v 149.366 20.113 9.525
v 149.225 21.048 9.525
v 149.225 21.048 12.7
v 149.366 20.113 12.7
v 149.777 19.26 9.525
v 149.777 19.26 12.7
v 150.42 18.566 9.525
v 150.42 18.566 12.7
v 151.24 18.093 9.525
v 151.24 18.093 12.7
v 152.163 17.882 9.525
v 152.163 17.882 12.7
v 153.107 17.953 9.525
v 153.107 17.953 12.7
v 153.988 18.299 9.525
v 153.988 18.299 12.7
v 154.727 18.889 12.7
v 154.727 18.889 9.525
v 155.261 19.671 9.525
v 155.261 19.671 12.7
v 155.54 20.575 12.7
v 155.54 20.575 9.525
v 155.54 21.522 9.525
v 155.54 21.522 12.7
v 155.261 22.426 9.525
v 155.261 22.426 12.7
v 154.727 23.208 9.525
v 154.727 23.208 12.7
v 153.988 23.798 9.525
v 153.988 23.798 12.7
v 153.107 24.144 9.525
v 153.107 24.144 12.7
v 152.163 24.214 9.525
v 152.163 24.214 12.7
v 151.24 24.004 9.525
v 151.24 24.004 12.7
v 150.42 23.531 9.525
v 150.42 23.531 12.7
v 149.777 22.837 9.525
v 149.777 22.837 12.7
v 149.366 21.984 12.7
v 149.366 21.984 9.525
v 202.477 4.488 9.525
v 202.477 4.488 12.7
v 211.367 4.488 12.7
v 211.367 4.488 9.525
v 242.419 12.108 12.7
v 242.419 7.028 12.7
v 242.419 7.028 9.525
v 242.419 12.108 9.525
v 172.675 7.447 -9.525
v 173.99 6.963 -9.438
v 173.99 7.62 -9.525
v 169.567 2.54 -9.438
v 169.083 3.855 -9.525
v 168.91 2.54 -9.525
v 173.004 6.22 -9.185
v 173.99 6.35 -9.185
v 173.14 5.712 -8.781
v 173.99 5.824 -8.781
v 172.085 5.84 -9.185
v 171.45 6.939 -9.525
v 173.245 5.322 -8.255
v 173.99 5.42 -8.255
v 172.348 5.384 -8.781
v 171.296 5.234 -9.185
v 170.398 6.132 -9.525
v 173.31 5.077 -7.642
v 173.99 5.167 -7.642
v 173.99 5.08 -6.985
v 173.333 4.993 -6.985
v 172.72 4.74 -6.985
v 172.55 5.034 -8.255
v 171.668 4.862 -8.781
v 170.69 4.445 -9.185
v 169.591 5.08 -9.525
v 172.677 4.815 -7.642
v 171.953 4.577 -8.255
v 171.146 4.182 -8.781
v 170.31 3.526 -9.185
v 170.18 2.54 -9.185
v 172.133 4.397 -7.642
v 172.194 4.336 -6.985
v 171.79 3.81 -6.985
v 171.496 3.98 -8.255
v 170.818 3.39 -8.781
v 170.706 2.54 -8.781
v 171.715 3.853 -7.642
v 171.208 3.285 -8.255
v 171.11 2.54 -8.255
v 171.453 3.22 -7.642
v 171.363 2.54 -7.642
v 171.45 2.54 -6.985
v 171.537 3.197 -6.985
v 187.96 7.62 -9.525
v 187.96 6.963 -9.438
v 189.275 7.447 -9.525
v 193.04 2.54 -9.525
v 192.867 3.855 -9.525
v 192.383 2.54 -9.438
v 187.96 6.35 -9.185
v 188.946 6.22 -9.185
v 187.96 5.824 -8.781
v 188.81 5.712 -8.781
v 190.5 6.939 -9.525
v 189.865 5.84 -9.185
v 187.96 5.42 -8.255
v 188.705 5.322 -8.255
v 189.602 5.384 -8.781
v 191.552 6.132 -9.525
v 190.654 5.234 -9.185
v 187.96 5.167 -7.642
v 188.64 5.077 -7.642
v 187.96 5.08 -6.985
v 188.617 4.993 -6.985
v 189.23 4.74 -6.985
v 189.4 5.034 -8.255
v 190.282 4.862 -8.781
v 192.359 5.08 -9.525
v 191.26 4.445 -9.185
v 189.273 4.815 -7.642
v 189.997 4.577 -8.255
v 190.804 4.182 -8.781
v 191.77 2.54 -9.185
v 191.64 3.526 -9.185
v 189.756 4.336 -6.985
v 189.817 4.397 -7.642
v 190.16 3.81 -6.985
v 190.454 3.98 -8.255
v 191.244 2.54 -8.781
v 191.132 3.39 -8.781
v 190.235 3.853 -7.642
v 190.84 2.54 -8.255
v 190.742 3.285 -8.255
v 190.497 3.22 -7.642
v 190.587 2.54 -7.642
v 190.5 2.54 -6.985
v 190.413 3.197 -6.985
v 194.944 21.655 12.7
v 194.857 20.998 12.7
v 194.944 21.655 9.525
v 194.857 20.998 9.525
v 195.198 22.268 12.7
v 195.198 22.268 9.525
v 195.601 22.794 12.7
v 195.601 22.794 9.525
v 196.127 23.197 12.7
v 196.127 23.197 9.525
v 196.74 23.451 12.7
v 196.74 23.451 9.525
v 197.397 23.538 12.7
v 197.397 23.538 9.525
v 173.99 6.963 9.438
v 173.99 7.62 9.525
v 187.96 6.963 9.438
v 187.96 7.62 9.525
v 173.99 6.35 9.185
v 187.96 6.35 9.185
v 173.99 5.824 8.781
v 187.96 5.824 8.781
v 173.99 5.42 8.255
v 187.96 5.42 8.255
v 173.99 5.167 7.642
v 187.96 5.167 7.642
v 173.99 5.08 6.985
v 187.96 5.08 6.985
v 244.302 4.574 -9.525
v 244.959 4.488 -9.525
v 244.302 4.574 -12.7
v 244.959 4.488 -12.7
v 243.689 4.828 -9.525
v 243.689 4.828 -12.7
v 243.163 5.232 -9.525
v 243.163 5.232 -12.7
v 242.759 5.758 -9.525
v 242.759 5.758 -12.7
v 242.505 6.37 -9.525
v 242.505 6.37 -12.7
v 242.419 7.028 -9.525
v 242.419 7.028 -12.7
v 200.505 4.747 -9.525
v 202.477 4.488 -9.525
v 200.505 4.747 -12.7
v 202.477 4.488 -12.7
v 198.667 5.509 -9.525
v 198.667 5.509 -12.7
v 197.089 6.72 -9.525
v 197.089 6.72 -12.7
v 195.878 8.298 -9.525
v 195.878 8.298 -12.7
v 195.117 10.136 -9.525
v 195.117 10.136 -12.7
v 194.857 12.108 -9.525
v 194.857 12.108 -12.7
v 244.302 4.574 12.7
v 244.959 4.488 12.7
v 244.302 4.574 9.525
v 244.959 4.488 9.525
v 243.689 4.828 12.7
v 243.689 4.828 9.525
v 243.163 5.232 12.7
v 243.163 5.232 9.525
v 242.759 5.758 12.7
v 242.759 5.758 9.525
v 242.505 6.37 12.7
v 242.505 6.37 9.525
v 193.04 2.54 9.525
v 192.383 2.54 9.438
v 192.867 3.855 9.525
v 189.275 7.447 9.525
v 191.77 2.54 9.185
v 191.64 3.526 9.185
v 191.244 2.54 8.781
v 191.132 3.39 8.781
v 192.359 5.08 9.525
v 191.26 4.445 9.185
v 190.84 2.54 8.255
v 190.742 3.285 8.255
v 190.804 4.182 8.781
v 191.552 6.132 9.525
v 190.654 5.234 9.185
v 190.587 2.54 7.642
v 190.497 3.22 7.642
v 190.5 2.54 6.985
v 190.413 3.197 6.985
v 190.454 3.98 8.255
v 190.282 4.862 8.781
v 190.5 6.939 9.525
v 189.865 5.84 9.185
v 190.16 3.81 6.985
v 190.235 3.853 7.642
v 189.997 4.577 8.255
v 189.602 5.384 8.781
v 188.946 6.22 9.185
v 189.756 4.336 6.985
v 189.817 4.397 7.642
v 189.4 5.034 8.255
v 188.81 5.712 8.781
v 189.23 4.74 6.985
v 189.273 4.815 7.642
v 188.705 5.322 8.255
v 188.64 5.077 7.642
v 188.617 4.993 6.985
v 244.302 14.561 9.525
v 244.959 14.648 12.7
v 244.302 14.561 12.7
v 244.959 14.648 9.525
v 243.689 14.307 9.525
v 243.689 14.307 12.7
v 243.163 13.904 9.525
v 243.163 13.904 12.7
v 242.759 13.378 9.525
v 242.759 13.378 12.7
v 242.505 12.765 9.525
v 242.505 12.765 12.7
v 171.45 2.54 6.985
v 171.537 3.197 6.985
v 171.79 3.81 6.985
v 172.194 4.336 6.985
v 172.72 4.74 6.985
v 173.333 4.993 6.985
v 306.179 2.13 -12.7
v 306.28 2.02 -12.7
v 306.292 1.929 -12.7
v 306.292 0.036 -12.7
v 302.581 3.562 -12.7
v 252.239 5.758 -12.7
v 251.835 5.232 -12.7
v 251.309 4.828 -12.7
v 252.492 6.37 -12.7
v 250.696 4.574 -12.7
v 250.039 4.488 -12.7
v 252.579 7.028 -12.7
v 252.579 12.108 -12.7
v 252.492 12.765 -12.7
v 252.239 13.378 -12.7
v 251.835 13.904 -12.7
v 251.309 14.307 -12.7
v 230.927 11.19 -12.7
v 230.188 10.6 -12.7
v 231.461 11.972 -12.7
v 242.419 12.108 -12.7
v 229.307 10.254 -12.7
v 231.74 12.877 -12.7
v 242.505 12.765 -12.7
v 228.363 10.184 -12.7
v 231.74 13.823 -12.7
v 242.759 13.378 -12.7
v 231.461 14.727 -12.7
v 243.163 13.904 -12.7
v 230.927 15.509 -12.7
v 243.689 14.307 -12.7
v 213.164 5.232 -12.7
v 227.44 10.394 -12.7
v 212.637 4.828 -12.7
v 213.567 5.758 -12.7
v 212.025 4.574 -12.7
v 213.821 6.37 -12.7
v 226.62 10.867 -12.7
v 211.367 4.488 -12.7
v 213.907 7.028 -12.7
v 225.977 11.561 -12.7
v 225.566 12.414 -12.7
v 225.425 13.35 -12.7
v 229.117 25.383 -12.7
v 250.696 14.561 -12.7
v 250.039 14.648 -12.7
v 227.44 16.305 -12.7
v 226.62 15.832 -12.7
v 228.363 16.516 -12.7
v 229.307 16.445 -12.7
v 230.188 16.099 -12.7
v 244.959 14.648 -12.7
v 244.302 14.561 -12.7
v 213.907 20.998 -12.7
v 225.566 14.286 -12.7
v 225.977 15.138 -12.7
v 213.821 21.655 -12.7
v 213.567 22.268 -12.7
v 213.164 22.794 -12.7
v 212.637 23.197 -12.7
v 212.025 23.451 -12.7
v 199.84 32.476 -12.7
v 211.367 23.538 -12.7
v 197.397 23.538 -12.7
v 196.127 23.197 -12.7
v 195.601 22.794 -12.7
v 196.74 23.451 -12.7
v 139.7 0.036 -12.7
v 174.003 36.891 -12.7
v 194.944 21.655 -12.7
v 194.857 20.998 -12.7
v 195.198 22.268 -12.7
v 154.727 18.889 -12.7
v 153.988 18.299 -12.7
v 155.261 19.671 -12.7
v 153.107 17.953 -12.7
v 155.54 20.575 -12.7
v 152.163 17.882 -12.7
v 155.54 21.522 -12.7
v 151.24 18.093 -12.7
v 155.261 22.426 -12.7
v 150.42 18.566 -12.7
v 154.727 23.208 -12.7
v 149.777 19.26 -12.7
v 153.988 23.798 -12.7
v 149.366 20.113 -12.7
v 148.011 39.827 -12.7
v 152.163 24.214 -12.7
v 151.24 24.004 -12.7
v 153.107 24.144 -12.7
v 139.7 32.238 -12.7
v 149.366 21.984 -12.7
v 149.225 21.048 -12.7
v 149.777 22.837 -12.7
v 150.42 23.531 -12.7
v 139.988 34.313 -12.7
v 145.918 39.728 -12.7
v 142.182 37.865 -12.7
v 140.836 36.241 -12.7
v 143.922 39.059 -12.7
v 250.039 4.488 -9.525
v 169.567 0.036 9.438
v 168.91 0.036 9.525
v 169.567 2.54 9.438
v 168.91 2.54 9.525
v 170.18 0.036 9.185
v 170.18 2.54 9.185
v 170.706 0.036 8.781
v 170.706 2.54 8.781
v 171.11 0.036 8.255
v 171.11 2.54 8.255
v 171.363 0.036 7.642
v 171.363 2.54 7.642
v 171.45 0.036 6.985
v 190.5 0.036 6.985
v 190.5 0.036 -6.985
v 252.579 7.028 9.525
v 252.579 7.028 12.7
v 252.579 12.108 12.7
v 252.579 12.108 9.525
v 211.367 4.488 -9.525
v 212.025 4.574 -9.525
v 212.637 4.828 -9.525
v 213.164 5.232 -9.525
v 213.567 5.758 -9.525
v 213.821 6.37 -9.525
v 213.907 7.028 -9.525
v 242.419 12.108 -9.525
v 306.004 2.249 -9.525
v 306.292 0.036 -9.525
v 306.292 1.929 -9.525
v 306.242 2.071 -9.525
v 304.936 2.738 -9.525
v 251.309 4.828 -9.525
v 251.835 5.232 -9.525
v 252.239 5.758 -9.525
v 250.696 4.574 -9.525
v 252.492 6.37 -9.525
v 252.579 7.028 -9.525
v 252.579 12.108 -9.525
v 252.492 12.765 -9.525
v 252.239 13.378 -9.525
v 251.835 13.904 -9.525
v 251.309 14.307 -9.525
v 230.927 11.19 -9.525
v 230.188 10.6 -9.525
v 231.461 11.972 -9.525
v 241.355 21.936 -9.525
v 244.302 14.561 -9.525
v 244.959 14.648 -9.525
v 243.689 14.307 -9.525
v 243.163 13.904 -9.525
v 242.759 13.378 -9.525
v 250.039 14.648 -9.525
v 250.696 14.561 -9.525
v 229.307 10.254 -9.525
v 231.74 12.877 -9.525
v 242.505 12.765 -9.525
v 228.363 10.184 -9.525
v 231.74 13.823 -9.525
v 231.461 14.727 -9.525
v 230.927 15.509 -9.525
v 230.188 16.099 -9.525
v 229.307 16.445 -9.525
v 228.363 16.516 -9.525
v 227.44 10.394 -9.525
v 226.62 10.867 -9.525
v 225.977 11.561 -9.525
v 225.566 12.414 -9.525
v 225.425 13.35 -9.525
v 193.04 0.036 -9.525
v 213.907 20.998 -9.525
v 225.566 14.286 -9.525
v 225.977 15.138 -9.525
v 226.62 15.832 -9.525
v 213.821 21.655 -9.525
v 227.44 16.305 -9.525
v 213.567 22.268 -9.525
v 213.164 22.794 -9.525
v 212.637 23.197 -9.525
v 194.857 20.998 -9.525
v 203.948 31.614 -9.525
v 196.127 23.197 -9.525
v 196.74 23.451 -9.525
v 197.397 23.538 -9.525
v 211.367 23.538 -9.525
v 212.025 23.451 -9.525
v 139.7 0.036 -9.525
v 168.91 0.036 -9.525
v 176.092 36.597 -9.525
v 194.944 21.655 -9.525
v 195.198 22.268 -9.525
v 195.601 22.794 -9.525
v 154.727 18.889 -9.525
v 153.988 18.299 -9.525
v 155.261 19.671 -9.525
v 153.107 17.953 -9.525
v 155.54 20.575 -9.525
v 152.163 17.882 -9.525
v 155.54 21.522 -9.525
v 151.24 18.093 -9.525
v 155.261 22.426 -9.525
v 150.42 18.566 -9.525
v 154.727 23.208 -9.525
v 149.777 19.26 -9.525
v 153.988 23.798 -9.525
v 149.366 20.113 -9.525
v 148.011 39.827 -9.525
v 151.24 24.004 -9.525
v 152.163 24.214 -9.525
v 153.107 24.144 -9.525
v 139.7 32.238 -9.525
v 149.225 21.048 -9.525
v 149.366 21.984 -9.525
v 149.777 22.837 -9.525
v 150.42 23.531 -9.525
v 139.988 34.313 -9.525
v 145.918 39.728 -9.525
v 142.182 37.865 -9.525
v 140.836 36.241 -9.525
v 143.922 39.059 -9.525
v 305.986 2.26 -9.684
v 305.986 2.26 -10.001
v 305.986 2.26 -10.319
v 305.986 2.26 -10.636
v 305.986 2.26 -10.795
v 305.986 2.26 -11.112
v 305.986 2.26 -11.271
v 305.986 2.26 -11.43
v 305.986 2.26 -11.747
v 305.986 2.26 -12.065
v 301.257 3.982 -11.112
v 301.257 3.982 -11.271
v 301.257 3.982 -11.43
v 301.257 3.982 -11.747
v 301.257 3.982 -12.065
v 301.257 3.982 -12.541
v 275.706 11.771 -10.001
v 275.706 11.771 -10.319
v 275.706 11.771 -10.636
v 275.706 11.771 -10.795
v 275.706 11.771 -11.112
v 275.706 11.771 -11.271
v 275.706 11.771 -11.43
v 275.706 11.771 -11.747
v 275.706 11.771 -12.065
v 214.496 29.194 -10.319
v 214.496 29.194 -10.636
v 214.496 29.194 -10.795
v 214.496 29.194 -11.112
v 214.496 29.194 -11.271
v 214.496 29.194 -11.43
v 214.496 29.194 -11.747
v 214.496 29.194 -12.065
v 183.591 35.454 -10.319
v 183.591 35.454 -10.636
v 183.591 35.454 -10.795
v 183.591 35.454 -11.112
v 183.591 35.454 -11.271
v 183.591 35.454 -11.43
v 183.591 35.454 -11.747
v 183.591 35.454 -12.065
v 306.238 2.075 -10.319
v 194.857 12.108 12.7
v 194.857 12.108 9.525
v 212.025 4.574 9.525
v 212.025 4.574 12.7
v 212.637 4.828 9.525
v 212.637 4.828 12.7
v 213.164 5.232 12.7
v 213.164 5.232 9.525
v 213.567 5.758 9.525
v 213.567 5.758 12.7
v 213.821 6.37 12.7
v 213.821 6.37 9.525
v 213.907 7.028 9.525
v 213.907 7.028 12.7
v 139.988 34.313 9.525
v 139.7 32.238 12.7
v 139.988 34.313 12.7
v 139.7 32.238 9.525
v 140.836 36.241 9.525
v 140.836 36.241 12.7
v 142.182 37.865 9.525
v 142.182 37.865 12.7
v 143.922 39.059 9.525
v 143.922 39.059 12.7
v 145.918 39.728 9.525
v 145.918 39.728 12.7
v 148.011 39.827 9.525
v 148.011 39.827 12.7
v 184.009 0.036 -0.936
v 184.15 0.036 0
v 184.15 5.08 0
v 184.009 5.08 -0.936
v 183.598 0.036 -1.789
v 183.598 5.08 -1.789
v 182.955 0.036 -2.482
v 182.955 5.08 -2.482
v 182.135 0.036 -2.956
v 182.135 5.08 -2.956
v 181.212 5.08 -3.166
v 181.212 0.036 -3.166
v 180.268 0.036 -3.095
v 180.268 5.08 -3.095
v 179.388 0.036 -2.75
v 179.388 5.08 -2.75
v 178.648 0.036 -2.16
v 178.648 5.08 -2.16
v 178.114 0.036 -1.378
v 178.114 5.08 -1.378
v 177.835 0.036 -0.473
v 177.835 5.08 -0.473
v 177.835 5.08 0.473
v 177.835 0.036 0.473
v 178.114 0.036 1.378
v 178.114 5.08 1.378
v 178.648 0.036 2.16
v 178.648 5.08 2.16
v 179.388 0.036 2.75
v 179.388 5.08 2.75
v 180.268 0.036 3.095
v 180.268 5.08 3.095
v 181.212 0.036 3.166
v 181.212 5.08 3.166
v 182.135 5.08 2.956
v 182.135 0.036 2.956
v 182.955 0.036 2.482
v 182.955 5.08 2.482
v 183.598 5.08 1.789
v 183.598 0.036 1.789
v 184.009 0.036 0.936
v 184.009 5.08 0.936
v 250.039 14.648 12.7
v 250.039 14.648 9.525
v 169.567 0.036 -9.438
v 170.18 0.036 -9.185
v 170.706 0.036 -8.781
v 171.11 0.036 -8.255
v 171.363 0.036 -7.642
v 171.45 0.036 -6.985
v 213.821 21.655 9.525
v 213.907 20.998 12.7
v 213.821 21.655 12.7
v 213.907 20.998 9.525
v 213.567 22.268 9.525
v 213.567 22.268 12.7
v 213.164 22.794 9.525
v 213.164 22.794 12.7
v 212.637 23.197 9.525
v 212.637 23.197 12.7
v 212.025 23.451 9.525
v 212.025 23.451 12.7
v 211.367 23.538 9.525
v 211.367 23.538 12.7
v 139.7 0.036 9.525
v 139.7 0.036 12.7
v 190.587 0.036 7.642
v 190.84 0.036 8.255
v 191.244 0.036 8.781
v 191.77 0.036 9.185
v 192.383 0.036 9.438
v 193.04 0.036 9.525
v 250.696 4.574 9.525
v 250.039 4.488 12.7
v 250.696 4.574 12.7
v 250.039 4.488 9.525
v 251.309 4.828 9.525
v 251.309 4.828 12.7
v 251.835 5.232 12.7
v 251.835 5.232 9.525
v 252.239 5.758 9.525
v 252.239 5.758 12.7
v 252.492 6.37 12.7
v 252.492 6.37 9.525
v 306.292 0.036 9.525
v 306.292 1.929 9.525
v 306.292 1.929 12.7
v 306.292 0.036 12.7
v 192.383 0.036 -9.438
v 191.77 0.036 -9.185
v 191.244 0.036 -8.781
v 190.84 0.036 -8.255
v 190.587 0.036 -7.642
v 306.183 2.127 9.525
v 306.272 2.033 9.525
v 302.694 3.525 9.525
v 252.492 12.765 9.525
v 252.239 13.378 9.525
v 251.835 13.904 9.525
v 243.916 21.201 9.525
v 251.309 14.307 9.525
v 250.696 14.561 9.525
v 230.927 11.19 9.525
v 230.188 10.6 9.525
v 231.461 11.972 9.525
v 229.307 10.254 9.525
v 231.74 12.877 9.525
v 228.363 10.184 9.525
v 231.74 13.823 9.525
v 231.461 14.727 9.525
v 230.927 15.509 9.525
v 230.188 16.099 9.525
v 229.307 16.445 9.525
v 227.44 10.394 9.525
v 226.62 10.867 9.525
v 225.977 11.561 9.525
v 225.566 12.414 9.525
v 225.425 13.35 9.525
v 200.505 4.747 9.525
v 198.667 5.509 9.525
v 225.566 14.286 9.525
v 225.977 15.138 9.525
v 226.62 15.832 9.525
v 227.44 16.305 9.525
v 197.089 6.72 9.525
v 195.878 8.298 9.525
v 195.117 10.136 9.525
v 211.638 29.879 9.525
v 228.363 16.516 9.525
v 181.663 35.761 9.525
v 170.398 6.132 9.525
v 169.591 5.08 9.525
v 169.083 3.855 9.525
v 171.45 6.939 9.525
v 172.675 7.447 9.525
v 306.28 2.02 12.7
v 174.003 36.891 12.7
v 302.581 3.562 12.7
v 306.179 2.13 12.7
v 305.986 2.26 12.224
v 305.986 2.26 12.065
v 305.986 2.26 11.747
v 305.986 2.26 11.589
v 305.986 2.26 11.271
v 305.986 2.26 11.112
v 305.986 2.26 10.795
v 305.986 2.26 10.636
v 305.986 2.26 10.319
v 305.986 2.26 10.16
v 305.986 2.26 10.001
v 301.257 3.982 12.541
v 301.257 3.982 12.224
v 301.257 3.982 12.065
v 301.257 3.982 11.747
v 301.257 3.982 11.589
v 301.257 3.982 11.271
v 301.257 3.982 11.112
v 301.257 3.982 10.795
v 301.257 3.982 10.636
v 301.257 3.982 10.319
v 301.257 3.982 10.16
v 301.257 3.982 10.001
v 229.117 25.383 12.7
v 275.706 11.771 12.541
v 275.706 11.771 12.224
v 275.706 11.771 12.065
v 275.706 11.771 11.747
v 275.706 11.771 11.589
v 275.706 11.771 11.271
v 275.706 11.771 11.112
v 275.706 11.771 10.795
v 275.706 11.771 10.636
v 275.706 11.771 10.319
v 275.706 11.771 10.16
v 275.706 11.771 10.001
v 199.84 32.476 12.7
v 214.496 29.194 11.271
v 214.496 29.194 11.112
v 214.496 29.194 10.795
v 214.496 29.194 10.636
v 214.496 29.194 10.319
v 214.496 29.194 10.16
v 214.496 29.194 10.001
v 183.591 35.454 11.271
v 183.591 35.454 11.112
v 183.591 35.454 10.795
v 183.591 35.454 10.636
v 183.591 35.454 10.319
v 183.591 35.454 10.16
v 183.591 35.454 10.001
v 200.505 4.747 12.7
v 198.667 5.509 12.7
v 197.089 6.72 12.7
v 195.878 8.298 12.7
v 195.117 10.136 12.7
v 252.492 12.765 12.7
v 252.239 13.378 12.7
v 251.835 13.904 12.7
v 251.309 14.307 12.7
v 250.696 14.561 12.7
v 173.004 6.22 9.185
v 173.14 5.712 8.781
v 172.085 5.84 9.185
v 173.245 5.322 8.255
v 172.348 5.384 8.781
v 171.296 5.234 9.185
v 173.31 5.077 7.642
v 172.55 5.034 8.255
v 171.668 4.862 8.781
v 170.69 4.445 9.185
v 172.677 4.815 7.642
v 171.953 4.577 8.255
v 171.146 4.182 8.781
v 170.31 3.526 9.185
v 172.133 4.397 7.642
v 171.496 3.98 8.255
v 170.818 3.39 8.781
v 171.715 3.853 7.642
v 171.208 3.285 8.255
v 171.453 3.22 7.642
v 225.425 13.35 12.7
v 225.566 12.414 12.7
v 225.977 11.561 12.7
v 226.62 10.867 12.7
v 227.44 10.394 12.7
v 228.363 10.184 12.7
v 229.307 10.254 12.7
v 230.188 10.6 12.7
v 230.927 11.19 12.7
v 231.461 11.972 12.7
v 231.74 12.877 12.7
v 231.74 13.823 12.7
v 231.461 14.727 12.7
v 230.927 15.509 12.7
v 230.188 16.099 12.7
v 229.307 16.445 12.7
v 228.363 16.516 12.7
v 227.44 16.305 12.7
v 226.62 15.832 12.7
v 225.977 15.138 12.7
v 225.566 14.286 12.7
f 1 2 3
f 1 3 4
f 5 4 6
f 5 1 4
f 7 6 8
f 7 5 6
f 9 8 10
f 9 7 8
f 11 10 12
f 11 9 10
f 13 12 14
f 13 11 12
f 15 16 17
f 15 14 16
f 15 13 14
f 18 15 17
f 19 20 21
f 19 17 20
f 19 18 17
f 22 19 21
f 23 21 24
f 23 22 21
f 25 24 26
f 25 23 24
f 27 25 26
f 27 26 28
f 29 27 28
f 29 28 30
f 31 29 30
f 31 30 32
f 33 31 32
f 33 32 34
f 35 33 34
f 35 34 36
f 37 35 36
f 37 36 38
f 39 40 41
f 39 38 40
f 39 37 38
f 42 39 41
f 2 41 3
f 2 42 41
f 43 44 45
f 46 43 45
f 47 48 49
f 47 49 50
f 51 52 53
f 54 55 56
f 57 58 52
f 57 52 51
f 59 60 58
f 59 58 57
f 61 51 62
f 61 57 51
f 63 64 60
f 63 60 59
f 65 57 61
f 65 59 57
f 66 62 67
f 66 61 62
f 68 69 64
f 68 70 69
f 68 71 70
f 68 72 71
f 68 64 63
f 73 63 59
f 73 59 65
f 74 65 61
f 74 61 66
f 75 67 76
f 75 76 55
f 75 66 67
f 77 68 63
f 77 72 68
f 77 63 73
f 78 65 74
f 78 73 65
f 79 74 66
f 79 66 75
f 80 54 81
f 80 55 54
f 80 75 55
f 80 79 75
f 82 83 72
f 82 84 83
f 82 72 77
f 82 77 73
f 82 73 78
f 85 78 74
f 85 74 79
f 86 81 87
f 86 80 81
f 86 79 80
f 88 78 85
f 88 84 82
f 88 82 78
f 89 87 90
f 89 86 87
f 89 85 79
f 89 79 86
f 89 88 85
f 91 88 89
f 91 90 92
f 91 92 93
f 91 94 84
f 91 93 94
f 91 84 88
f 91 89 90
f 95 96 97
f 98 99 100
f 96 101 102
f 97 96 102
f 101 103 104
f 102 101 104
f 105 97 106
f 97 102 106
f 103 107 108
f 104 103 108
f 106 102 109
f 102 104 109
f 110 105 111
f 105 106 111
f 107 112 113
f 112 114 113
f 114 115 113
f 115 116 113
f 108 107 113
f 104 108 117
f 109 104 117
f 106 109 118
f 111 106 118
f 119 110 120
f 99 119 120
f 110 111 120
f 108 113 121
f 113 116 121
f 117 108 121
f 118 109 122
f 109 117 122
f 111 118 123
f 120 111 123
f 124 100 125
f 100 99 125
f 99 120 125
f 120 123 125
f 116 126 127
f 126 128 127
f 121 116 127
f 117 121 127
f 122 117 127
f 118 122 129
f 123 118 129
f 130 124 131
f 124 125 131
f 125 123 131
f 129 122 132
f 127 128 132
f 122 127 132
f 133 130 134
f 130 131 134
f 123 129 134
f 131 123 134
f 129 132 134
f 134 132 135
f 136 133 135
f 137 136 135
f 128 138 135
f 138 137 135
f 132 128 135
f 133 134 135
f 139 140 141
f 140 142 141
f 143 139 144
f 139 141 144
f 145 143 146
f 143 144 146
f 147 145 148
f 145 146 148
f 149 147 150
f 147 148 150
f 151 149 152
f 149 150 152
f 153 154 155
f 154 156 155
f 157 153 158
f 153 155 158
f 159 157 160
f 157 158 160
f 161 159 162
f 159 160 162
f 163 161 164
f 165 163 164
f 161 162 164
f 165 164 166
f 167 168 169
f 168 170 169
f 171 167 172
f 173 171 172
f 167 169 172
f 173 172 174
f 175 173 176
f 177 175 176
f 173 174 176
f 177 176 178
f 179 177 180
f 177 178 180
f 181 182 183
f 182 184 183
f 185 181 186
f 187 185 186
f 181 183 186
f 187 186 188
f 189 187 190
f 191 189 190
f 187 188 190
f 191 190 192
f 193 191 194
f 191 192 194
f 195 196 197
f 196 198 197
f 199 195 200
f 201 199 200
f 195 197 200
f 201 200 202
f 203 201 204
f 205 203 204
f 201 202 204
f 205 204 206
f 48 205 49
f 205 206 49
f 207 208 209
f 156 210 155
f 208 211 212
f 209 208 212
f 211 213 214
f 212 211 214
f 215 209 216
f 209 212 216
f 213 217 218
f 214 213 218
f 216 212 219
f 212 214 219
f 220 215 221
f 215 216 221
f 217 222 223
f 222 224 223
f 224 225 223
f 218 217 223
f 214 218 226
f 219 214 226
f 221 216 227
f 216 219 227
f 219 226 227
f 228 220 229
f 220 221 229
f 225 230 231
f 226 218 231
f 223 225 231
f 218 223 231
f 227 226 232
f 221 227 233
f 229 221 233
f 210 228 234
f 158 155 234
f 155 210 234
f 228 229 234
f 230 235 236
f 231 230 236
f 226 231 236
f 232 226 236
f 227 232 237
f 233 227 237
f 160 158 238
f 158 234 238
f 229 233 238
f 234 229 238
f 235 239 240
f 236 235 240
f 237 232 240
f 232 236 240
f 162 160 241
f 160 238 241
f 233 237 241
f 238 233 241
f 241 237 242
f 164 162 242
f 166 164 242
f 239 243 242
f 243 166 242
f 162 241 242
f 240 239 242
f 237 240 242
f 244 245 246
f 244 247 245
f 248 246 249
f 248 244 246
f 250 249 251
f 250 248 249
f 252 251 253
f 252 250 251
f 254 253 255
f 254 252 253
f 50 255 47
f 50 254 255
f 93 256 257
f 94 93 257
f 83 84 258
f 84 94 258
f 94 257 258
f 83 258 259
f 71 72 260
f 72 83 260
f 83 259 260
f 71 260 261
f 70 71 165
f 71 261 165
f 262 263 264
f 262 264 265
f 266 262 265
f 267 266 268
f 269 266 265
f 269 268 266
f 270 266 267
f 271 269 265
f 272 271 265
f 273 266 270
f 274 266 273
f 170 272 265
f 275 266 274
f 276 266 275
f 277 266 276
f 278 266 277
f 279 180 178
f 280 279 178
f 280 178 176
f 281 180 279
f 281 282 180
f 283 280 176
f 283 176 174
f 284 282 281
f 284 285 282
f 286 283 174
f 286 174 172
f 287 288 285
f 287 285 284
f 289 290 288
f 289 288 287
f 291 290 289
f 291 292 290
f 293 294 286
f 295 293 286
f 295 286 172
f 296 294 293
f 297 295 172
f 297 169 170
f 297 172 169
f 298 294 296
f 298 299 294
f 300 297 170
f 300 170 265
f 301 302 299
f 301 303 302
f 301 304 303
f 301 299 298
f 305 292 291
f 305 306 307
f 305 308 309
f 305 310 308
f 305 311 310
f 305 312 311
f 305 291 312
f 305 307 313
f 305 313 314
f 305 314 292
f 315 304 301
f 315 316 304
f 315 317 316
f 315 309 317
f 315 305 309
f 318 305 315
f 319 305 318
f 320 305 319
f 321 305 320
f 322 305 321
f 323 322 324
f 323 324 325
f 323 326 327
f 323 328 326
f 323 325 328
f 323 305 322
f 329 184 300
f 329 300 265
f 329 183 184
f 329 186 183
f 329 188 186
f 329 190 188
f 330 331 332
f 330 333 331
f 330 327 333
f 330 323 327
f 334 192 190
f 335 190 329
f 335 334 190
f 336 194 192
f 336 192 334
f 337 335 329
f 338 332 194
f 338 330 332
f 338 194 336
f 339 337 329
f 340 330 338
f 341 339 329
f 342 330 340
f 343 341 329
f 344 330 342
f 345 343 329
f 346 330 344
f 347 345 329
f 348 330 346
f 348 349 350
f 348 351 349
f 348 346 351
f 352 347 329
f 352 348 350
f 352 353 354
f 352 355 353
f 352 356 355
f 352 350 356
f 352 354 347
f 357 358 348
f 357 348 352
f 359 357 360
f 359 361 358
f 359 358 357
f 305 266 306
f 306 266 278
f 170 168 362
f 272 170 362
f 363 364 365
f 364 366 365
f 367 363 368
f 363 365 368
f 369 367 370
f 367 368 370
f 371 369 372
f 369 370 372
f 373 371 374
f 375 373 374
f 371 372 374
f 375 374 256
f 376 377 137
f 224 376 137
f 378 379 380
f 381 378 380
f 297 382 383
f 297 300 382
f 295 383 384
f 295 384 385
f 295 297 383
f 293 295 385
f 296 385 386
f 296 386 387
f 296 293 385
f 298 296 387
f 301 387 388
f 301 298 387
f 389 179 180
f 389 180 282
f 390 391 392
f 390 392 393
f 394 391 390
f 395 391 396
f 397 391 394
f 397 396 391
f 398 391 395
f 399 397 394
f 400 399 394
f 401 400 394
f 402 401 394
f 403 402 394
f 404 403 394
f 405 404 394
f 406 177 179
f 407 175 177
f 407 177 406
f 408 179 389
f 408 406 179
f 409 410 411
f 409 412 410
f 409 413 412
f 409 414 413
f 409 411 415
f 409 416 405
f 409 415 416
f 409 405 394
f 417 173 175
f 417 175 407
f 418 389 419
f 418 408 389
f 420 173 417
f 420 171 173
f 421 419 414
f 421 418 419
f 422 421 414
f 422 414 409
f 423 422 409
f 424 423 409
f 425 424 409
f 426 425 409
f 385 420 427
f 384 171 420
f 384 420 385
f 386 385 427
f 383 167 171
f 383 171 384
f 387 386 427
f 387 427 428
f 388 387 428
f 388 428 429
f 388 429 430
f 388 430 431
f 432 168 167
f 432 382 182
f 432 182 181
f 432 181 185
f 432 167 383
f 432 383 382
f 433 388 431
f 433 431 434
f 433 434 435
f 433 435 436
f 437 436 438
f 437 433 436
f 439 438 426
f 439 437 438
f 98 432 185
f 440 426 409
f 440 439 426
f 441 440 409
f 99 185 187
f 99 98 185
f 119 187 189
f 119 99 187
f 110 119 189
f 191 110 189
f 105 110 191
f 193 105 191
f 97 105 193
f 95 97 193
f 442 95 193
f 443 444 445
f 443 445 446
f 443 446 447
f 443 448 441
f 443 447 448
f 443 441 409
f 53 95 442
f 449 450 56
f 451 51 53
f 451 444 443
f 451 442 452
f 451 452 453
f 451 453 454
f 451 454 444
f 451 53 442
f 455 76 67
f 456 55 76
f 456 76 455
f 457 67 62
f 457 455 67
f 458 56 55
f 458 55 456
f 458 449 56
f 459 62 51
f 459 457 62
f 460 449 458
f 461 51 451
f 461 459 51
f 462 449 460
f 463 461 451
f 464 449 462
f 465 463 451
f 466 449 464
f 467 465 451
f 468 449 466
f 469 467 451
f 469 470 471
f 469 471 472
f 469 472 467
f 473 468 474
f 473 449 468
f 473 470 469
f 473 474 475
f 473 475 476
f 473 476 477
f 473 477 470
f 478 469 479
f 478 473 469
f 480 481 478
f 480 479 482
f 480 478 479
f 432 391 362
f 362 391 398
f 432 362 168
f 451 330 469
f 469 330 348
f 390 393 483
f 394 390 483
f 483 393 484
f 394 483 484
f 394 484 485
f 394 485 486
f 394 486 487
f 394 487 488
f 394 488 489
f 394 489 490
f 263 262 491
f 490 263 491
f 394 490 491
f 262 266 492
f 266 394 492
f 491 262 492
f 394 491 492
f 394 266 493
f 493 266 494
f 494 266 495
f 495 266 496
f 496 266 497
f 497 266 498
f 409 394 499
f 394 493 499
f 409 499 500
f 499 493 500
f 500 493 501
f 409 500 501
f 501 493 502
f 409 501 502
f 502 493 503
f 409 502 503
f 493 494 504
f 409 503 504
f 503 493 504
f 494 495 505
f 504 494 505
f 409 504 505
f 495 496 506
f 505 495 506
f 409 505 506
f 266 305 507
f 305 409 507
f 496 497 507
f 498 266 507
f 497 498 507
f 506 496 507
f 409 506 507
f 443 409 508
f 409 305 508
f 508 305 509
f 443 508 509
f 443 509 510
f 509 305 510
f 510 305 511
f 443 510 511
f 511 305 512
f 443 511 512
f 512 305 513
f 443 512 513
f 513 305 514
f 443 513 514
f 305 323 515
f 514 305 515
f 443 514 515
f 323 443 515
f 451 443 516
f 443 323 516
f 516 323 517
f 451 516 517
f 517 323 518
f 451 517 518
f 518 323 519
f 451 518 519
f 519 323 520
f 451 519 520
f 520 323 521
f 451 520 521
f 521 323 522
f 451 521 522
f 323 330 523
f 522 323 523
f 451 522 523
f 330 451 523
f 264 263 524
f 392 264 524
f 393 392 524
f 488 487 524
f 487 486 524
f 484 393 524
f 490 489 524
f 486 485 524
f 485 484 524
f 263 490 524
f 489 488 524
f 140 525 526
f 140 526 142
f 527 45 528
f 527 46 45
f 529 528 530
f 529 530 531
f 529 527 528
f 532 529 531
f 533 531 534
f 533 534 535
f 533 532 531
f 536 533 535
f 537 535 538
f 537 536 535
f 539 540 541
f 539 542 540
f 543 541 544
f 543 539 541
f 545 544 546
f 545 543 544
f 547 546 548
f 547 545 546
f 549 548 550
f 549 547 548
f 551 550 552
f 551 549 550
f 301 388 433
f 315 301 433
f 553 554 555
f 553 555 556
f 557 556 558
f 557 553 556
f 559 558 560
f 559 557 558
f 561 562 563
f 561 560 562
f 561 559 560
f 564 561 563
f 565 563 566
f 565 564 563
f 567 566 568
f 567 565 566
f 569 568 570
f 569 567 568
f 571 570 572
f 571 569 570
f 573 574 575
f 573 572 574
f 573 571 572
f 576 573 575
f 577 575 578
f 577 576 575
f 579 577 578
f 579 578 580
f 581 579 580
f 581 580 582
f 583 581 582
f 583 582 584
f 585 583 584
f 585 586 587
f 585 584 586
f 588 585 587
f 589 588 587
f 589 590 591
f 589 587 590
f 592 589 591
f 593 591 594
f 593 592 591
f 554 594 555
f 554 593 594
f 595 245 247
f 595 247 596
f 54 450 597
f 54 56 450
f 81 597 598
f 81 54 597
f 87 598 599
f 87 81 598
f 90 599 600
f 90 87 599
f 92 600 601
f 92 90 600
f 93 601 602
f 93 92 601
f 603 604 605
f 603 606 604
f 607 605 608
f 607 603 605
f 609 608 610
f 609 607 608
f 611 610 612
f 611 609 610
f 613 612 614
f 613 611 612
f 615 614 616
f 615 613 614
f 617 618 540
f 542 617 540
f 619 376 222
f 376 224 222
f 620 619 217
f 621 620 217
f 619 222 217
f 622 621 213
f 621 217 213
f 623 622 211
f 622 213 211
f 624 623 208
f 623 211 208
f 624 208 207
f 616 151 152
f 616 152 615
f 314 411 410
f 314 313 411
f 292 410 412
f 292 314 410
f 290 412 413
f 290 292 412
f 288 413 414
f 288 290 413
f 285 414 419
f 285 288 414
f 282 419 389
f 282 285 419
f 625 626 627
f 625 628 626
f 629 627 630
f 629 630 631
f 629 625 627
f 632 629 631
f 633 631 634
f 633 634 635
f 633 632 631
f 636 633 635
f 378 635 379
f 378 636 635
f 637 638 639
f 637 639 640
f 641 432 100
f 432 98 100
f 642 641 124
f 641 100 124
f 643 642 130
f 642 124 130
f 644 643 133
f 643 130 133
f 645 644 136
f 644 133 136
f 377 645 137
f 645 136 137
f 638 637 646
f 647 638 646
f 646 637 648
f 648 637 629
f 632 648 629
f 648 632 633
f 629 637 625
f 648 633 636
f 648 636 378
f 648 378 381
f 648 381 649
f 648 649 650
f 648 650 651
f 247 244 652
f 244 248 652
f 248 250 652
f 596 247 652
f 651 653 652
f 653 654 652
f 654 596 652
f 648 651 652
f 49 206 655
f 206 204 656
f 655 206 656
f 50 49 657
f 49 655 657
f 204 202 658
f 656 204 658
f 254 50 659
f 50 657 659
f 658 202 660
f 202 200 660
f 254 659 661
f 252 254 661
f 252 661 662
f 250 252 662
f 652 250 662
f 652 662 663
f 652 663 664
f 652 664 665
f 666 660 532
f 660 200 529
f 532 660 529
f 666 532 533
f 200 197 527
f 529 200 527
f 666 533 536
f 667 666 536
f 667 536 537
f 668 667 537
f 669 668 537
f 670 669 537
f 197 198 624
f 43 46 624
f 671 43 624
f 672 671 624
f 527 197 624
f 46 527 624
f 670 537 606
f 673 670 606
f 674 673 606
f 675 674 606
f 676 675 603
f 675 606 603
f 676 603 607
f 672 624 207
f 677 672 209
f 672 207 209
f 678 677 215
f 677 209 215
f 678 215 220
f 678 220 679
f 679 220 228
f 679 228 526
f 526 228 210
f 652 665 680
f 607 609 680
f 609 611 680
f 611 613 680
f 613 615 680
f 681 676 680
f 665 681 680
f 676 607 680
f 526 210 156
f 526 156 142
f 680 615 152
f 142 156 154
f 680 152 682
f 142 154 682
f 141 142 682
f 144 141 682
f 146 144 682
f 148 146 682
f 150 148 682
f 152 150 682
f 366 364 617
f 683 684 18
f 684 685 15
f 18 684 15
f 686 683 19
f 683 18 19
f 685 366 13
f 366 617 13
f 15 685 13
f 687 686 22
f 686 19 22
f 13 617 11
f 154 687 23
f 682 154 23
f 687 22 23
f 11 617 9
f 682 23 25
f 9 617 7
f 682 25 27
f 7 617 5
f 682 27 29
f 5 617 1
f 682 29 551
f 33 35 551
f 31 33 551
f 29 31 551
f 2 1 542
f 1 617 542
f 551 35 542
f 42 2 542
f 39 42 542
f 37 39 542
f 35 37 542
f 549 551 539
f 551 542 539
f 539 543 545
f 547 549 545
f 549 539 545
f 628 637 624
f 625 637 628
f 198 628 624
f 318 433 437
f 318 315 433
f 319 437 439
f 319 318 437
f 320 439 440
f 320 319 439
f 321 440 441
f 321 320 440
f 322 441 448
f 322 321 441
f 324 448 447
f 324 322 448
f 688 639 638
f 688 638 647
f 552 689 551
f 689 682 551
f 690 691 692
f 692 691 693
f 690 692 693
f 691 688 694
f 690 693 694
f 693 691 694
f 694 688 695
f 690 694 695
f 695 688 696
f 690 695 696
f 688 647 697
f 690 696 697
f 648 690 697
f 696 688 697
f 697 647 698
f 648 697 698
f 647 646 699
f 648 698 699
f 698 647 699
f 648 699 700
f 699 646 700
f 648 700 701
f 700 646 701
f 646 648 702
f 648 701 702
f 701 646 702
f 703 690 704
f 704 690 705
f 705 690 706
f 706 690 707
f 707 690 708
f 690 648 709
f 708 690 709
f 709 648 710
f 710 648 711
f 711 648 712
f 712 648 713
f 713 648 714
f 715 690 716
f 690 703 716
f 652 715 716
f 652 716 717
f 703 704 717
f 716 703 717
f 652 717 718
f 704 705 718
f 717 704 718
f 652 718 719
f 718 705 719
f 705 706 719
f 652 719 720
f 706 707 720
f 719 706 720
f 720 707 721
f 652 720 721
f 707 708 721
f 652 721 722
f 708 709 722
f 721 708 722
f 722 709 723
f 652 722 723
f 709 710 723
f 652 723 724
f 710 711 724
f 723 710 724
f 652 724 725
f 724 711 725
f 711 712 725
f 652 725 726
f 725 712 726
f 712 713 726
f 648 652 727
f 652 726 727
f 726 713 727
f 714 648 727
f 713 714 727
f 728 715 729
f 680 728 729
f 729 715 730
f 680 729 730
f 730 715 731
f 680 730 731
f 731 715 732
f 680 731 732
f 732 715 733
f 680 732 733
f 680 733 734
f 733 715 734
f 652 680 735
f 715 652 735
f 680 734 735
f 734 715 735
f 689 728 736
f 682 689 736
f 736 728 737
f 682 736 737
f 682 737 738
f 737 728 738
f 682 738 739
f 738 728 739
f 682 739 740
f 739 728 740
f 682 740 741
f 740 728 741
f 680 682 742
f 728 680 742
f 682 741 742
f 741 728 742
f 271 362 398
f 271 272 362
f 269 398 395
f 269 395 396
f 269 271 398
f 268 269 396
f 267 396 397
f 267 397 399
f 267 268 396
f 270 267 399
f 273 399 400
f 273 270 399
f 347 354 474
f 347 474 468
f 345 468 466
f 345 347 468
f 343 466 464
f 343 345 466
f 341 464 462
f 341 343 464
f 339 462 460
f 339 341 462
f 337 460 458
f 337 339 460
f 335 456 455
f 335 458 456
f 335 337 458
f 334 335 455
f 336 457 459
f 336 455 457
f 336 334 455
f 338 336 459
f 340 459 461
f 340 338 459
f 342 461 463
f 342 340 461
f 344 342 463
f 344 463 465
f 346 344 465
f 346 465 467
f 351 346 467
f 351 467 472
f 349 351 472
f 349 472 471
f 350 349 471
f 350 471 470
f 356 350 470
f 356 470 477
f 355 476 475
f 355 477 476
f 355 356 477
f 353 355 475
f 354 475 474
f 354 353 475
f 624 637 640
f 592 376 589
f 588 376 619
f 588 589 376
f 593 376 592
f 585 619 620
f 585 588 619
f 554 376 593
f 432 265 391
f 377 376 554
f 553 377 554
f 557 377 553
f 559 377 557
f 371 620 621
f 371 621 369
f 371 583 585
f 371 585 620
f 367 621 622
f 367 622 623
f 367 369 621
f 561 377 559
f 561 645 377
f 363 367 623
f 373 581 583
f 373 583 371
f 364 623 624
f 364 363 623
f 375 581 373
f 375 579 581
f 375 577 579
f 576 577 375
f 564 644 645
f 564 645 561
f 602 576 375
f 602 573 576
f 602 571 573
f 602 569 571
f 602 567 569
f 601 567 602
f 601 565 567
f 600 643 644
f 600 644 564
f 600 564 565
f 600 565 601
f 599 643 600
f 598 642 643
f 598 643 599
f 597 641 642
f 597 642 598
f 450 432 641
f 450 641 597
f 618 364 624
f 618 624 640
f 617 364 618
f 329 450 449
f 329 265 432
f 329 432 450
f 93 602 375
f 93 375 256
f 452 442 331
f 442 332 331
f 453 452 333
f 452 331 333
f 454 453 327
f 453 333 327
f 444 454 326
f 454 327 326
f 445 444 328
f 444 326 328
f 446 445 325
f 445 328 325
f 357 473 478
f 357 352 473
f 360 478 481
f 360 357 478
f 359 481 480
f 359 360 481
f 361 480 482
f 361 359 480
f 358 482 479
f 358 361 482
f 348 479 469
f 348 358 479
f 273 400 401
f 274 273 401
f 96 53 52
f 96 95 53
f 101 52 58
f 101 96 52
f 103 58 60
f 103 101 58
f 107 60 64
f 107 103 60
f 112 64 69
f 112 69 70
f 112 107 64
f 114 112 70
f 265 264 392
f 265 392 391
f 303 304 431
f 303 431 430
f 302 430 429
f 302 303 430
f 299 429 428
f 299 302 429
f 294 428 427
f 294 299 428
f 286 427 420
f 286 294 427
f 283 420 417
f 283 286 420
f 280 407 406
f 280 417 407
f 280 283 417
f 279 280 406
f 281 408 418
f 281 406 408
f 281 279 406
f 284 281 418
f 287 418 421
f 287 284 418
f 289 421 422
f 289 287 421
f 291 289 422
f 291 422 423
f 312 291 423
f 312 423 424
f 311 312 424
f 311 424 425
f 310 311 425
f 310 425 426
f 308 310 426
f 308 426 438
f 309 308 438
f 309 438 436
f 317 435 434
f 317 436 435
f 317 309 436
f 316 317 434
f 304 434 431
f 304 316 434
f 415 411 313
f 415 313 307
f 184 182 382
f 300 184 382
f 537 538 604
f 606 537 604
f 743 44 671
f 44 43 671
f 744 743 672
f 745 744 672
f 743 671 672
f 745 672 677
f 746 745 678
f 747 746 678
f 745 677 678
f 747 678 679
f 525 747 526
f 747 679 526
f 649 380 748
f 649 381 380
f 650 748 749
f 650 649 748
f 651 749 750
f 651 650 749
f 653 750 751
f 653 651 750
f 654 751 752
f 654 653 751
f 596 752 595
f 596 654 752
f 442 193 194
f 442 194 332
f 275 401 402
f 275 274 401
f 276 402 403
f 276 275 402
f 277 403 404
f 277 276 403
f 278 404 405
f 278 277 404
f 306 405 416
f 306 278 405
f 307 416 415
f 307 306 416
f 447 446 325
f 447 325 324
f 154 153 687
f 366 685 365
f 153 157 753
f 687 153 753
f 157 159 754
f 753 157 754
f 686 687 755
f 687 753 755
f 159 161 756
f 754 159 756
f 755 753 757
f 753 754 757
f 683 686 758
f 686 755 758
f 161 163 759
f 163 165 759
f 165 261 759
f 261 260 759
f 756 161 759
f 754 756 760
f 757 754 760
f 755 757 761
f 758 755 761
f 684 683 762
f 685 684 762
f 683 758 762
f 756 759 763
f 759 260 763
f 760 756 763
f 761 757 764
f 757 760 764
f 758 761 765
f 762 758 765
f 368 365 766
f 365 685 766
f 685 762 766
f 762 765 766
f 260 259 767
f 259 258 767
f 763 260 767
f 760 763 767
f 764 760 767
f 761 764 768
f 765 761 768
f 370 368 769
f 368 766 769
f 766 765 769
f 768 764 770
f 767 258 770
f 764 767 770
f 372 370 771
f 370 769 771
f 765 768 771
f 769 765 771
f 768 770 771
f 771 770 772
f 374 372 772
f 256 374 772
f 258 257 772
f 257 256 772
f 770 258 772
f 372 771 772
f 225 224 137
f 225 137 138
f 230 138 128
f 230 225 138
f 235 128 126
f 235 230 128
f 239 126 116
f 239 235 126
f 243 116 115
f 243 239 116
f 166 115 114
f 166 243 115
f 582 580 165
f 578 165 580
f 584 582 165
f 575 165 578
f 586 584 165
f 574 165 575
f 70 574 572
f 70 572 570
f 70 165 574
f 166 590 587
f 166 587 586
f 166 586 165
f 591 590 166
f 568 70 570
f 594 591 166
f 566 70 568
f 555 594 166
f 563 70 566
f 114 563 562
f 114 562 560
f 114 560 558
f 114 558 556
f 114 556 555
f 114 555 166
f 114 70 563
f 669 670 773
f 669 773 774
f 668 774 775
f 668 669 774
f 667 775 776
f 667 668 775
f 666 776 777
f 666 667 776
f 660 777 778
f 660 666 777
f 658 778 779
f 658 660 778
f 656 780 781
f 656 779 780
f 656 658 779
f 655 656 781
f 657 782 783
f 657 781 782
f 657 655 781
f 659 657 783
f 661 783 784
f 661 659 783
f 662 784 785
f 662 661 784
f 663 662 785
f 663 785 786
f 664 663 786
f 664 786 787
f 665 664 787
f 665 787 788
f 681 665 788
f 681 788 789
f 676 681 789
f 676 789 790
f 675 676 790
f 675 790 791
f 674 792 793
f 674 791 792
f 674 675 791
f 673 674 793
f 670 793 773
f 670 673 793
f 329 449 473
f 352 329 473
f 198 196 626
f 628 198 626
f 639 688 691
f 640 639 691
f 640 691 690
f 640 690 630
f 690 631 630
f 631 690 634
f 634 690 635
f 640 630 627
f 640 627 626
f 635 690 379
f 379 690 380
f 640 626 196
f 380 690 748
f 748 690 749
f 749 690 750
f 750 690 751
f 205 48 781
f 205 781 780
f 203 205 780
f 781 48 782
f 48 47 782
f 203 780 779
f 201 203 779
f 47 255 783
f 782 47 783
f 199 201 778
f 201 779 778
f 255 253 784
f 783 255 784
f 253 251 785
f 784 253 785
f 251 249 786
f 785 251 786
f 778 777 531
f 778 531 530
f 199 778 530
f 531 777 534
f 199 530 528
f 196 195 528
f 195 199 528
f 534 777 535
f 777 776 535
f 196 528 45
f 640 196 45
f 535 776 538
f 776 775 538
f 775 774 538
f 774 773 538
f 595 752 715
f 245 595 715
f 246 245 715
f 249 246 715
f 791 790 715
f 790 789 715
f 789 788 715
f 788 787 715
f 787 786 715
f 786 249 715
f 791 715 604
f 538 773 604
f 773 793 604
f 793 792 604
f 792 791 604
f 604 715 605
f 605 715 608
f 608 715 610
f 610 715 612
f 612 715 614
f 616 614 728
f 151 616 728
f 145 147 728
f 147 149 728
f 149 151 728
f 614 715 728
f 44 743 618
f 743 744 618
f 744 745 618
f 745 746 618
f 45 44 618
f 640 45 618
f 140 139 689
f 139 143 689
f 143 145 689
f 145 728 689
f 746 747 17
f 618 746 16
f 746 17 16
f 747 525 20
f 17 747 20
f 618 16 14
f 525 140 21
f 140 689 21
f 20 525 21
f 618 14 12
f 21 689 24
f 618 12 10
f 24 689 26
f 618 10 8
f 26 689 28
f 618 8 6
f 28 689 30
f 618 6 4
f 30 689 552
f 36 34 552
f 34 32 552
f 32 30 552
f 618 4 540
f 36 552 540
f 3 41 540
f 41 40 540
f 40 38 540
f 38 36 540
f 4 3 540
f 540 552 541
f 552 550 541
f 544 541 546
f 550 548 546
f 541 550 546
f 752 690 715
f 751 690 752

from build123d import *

# Parameters (mm, degrees)
BOSS_EXTRUDE1_DEPTH       = 12.7
BOSS_EXTRUDE1_DEPTH_BACK  = 12.7
SKETCH2_W                 = 19.05
SKETCH2_H                 = 49.651656102
CUT_EXTRUDE1_DEPTH        = 310.423757716
BOSS_EXTRUDE2_OUTLINE_W   = 38.1
BOSS_EXTRUDE2_OUTLINE_H   = 5.044027725
BOSS_EXTRUDE2_OUTLINE_W_2 = 19.05
BOSS_EXTRUDE2_DEPTH       = 19.05
CUT_EXTRUDE3_DEPTH        = 50.8
CUT_EXTRUDE3_DEPTH_BACK   = 50.8
SKETCH12_R                = 9.525
SKETCH12_R_2              = 3.175
SKETCH12_R_3              = 5
FILLET8_R                 = 2.54
SKETCH13_R                = 9.525
SKETCH13_R_2              = 5
CUT_EXTRUDE4_DEPTH        = 311.204708703
CUT_EXTRUDE5_DEPTH        = 309.603621169
CUT_EXTRUDE5_DEPTH_BACK   = 309.603621169
SKETCH14_R                = 3.175
FILLET9_R                 = 7.62
SKETCH16_W                = 19.05
SKETCH16_H                = 19.05
SKETCH16_W_2              = 10.16
SKETCH16_H_2              = 10.16
CUT_EXTRUDE6_DEPTH        = 1693.418
FILLET10_R                = 7.62
FILLET11_R                = 2.54


# Read off the part's stored shape, not the designer's step: Boss-Extrude2
with BuildPart() as part:
    # Sketch1 → Boss-Extrude1 (new, two sides: drawn at the far end of the back side and taken through both)
    with BuildSketch(Plane.XY.offset(-BOSS_EXTRUDE1_DEPTH_BACK)):
        with BuildLine():
            Line((306.2918866, 1.929193729), (306.2918866, 0.035972275))
            Line((306.2918866, 0.035972275), (18.385743088, 0.035972275))
            add(Edge.make_bspline(
                [(306.2918866, 1.929193729), (306.565703117, 2.60439044), (288.5800577, 7.542224382), (271.922557924, 13.119693618), (244.545512993, 21.039717296), (214.63705438, 29.578808281), (183.74892315, 35.843363942), (153.039666672, 39.584058053), (122.364389131, 41.910380286), (91.676834287, 42.234137684), (66.092232531, 40.375185886), (45.725322729, 37.15263137), (32.792424184, 34.392213233), (22.784634494, 30.143895353), (14.954380304, 26.333975955), (8.569620221, 21.769960087), (2.606076707, 16.225698301), (-1.858362456, 8.564778309), (3.017819974, 2.013571533), (8.993020993, 0.344786487), (13.886881629, 0.072440703), (17.418928388, 0.035163036), (18.385743088, 0.035972275)],
                knots=[0, 0, 0, 0, 0.025556044, 0.050960447, 0.101552747, 0.151805438, 0.201252492, 0.250083002, 0.298629141, 0.347026117, 0.395536064, 0.420002519, 0.444885368, 0.457915187, 0.471441031, 0.48620838, 0.494593531, 0.510948222, 0.521394631, 0.527823606, 0.539981828, 0.544566103, 0.544566103, 0.544566103, 0.544566103], degree=3))
        make_face()
    extrude(amount=BOSS_EXTRUDE1_DEPTH + BOSS_EXTRUDE1_DEPTH_BACK)

    # Sketch2 → Cut-Extrude1 (cut, through all)
    with BuildSketch(Plane(origin=(0, 0, 0), x_dir=(0, 0, -1), z_dir=(1, 0, 0))):
        with Locations((0, 22.711736939)):
            Rectangle(SKETCH2_W, SKETCH2_H)
    extrude(amount=CUT_EXTRUDE1_DEPTH, mode=Mode.SUBTRACT)


with BuildPart() as cut_extrude1_piece_1:
    # of the separate pieces the step leaves, piece 1, a body of its own (cut_extrude1_pieces)
    add(part.part.solids().sort_by_distance((306.2918866, 0.035972275, 9.525))[0])



with BuildPart() as cut_extrude1_piece_2:
    # of the separate pieces the step leaves, piece 2, a body of its own (cut_extrude1_pieces)
    add(part.part.solids().sort_by_distance((306.2918866, 1.929193729, -9.525))[0])


with BuildPart() as cut_extrude1_piece_1_1:
    add(cut_extrude1_piece_1.part)

    add(cut_extrude1_piece_2.part)  # Boss-Extrude2 merges Cut-Extrude1 piece 2
    # Boss-Extrude2 outline → Boss-Extrude2 (add)
    with BuildSketch(Plane.XY.offset(-9.525)):
        with Locations((50.8, 2.557986137)):
            Rectangle(BOSS_EXTRUDE2_OUTLINE_W, BOSS_EXTRUDE2_OUTLINE_H)
        with Locations((180.975, 2.557986137)):
            Rectangle(BOSS_EXTRUDE2_OUTLINE_W_2, BOSS_EXTRUDE2_OUTLINE_H)
    extrude(amount=BOSS_EXTRUDE2_DEPTH)

    # Sketch12 → Cut-Extrude3 (cut, two sides: drawn at the far end of the back side and taken through both)
    with BuildSketch(Plane.XY.offset(-CUT_EXTRUDE3_DEPTH_BACK)):
        with Locations(Location((82.55, 21.048356458, 0), (0, 0, 180))):
            Circle(SKETCH12_R)
        with Locations(Location((152.4, 21.048356458, 0), (0, 0, 180))):
            Circle(SKETCH12_R_2)
        with Locations(Location((228.6, 13.349794258, 0), (0, 0, 180))):
            Circle(SKETCH12_R_2)
        with Locations(Location((117.475, 21.048356458, 0), (0, 0, 180))):
            Circle(SKETCH12_R_3)
    extrude(amount=CUT_EXTRUDE3_DEPTH + CUT_EXTRUDE3_DEPTH_BACK, mode=Mode.SUBTRACT)

    # Fillet8
    fillet8_edges = [cut_extrude1_piece_1_1.edges().sort_by_distance(p)[0] for p in [
        (50.8, 5.08, -9.525),
        (69.85, 2.557986138, -9.525),
        (50.8, 5.08, 9.525),
        (69.85, 2.557986138, 9.525),
        (171.45, 2.557986138, -9.525),
        (171.45, 5.08, 0),
        (180.975, 5.08, 9.525),
        (190.5, 5.08, 0),
        (180.975, 5.08, -9.525),
        (190.5, 2.557986138, 9.525),
        (190.5, 2.557986138, -9.525),
        (171.45, 2.557986138, 9.525),
        (69.85, 5.08, 0),
        (31.75, 2.557986138, 9.525),
        (31.75, 5.08, 0),
        (31.75, 2.557986138, -9.525),
    ]]
    fillet(fillet8_edges, radius=FILLET8_R)

    # Sketch13 → Cut-Extrude4 (cut, through all)
    with BuildSketch(Plane.XY.offset(12.7)):
        with BuildLine():
            Line((18.385743088, 0.035972275), (139.7, 0.035972275))
            Line((139.7, 0.035972275), (139.7, 40.526097112))
            add(Edge.make_bspline(
                [(139.7, 40.526097112), (133.912966058, 40.971759709), (117.928487598, 41.957179581), (91.676834287, 42.234137684), (66.092232531, 40.375185886), (45.725322729, 37.15263137), (32.792424184, 34.392213233), (22.784634494, 30.143895353), (14.954380304, 26.333975955), (8.569620221, 21.769960087), (2.606076707, 16.225698301), (-1.858362456, 8.564778309), (3.017819974, 2.013571533), (8.993020993, 0.344786487), (13.886881629, 0.072440703), (17.418928388, 0.035163036), (18.385743088, 0.035972275)],
                knots=[0.271108315, 0.271108315, 0.271108315, 0.271108315, 0.298629141, 0.347026117, 0.395536064, 0.420002519, 0.444885368, 0.457915187, 0.471441031, 0.48620838, 0.494593531, 0.510948222, 0.521394631, 0.527823606, 0.539981828, 0.544566103, 0.544566103, 0.544566103, 0.544566103], degree=3))
        make_face()
        with Locations((82.55, 21.048356458)):
            Circle(SKETCH13_R, mode=Mode.SUBTRACT)
        with Locations((117.475, 21.048356458)):
            Circle(SKETCH13_R_2, mode=Mode.SUBTRACT)
    extrude(amount=-CUT_EXTRUDE4_DEPTH, mode=Mode.SUBTRACT)

    # Sketch14 → Cut-Extrude5 (cut, two sides: drawn at the far end of the back side and taken through both)
    with BuildSketch(Plane(origin=(0, 5.08, 0), x_dir=(1, 0, 0), z_dir=(0, 1, 0)).offset(-CUT_EXTRUDE5_DEPTH_BACK)):
        with Locations((180.975, 0)):
            Circle(SKETCH14_R)
    extrude(amount=CUT_EXTRUDE5_DEPTH + CUT_EXTRUDE5_DEPTH_BACK, mode=Mode.SUBTRACT)

    # Fillet9
    fillet9_edges = [cut_extrude1_piece_1_1.edges().sort_by_distance(p)[0] for p in [
        (139.7, 40.526097112, 11.1125),
        (139.7, 40.526097112, -11.1125),
    ]]
    fillet(fillet9_edges, radius=FILLET9_R)

    # Sketch16 → Cut-Extrude6 (cut)
    with BuildSketch(Plane.XY.offset(12.7)):
        with Locations((204.382492583, 14.012712879)):
            Rectangle(SKETCH16_W, SKETCH16_H)
        with Locations((247.498903959, 9.567712879)):
            Rectangle(SKETCH16_W_2, SKETCH16_H_2)
    extrude(amount=-CUT_EXTRUDE6_DEPTH, mode=Mode.SUBTRACT)

    # Fillet10
    fillet10_edges = [cut_extrude1_piece_1_1.edges().sort_by_distance(p)[0] for p in [
        (194.857492583, 4.487712879, -11.1125),
        (194.857492583, 4.487712879, 11.1125),
    ]]
    fillet(fillet10_edges, radius=FILLET10_R)

    # Fillet11
    fillet11_edges = [cut_extrude1_piece_1_1.edges().sort_by_distance(p)[0] for p in [
        (194.857492583, 23.537712879, -11.1125),
        (213.907492583, 23.537712879, -11.1125),
        (213.907492583, 4.487712879, -11.1125),
        (194.857492583, 23.537712879, 11.1125),
        (213.907492583, 23.537712879, 11.1125),
        (213.907492583, 4.487712879, 11.1125),
        (242.418903959, 4.487712879, -11.1125),
        (242.418903959, 14.647712879, -11.1125),
        (252.578903959, 14.647712879, -11.1125),
        (252.578903959, 4.487712879, -11.1125),
        (242.418903959, 4.487712879, 11.1125),
        (242.418903959, 14.647712879, 11.1125),
        (252.578903959, 14.647712879, 11.1125),
        (252.578903959, 4.487712879, 11.1125),
    ]]
    fillet(fillet11_edges, radius=FILLET11_R)


solid = cut_extrude1_piece_1_1.part
